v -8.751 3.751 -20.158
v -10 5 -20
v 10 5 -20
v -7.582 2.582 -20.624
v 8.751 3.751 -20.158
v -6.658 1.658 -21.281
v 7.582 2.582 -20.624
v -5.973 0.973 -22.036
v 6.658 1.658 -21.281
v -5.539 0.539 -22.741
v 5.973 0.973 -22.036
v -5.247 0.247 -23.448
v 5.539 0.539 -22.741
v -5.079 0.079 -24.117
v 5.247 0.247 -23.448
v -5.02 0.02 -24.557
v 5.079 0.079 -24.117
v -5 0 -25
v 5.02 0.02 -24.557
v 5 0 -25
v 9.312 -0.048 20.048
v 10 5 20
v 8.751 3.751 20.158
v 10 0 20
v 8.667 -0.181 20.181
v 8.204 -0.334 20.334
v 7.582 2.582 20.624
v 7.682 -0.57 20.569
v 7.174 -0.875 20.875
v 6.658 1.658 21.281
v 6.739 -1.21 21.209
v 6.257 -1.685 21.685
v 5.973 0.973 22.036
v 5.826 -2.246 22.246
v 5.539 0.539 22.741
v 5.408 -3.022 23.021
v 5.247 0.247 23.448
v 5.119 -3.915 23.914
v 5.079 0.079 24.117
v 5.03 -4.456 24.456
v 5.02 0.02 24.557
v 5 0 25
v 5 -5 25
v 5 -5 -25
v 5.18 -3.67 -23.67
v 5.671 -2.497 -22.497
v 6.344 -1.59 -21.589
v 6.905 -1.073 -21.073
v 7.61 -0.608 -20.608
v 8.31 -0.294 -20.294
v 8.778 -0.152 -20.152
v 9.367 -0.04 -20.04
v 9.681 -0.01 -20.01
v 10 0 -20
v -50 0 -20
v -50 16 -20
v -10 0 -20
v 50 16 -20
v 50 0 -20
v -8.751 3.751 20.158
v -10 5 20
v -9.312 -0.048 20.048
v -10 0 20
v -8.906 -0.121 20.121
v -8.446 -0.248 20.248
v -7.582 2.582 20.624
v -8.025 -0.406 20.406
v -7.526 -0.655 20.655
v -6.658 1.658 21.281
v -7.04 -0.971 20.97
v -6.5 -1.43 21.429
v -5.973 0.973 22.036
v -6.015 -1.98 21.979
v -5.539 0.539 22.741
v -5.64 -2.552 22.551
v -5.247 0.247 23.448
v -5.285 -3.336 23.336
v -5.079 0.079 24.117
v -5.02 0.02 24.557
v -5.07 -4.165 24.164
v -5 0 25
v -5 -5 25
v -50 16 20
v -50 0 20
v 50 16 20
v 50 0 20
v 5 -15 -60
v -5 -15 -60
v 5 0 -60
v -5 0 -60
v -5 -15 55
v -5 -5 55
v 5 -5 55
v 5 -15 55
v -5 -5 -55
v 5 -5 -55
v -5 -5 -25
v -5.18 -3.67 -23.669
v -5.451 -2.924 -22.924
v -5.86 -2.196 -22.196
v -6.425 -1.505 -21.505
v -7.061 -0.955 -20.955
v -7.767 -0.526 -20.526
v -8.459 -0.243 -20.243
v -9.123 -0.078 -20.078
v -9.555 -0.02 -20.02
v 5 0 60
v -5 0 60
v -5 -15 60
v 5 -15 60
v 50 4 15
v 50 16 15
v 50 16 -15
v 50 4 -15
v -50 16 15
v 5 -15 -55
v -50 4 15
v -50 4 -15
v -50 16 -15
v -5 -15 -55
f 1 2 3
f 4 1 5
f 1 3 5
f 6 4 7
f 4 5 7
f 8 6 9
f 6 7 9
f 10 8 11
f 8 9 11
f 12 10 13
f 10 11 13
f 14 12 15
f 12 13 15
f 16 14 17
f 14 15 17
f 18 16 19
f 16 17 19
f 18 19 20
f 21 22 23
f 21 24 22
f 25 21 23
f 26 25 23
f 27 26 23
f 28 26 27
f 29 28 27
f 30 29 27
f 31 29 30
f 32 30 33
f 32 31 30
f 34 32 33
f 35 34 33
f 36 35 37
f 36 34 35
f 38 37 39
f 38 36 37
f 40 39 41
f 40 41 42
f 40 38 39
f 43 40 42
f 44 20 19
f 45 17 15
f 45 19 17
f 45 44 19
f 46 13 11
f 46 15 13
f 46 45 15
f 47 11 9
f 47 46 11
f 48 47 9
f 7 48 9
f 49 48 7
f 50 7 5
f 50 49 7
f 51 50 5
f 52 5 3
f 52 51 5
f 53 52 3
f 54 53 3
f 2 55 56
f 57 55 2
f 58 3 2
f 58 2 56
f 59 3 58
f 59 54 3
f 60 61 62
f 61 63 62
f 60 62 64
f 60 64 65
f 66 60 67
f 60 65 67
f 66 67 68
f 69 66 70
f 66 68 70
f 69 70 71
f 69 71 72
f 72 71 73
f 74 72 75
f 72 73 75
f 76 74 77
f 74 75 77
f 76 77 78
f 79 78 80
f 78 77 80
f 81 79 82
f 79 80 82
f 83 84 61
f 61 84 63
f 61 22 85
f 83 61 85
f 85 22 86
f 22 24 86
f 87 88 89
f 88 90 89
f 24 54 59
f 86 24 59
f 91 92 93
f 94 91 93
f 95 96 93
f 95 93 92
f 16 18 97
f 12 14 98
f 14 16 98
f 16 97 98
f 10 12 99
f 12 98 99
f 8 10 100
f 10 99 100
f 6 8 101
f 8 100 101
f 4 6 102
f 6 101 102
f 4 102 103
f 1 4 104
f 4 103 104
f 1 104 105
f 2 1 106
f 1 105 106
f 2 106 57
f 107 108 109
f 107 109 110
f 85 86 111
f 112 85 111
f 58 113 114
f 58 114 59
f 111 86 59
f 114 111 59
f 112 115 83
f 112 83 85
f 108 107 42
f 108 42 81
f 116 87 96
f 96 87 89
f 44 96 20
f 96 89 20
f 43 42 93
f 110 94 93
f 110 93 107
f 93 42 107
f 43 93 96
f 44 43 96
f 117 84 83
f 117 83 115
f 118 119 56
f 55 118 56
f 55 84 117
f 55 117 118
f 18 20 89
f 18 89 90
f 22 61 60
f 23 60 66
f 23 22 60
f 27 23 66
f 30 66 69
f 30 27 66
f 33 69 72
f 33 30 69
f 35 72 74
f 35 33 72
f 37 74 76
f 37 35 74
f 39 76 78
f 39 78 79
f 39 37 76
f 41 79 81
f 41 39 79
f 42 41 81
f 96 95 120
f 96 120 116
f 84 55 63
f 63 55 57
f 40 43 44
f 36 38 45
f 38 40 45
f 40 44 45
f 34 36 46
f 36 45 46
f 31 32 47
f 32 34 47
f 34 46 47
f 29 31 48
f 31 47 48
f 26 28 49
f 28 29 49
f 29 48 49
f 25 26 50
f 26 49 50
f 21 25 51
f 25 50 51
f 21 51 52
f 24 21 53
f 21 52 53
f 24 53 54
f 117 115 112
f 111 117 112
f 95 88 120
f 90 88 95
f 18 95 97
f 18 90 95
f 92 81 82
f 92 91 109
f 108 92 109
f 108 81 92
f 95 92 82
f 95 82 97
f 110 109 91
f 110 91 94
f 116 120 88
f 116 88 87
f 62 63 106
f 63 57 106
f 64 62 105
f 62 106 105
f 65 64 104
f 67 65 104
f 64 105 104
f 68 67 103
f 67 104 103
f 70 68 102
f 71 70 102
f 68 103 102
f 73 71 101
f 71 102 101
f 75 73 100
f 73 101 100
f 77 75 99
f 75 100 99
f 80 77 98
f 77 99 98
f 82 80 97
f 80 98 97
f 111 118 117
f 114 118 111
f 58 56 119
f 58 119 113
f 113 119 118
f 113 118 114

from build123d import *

# Parameters (mm, degrees)
SKETCH1_W           = 100
SKETCH1_H           = 40
BOSS_EXTRUDE2_DEPTH = 16
SKETCH3_W           = 100
SKETCH3_H           = 30
CUT_EXTRUDE1_DEPTH  = 12
SKETCH4_W           = 10
SKETCH4_H           = 120
BOSS_EXTRUDE3_DEPTH = 5
SKETCH5_W           = 10
SKETCH5_H           = 5
BOSS_EXTRUDE4_DEPTH = 10
SKETCH6_W           = 10
SKETCH6_H           = 5
BOSS_EXTRUDE5_DEPTH = 10
FILLET1_R           = 5
FILLET2_R           = 5
FILLET3_R           = 5


with BuildPart() as part:
    # Sketch1 → Boss-Extrude2 (new body)
    with BuildSketch(Plane(origin=(0, 0, 0), x_dir=(1, 0, 0), z_dir=(0, 1, 0))):
        Rectangle(SKETCH1_W, SKETCH1_H)
    extrude(amount=BOSS_EXTRUDE2_DEPTH)

    # Sketch3 → Cut-Extrude1 (cut)
    with BuildSketch(Plane(origin=(0, 16, 0), x_dir=(1, 0, 0), z_dir=(0, 1, 0))):
        Rectangle(SKETCH3_W, SKETCH3_H)
    extrude(amount=-CUT_EXTRUDE1_DEPTH, mode=Mode.SUBTRACT)

    # Sketch4 → Boss-Extrude3 (add)
    with BuildSketch(Plane(origin=(0, 0, 0), x_dir=(-1, 0, 0), z_dir=(0, -1, 0))):
        Rectangle(SKETCH4_W, SKETCH4_H)
    extrude(amount=BOSS_EXTRUDE3_DEPTH)

    # Sketch5 → Boss-Extrude4 (add)
    with BuildSketch(Plane.XZ.offset(5)):
        with Locations((0, 57.5)):
            Rectangle(SKETCH5_W, SKETCH5_H)
    extrude(amount=BOSS_EXTRUDE4_DEPTH)

    # Sketch6 → Boss-Extrude5 (add)
    with BuildSketch(Plane.XZ.offset(5)):
        with Locations((0, -57.5)):
            Rectangle(SKETCH6_W, SKETCH6_H)
    extrude(amount=BOSS_EXTRUDE5_DEPTH)

    # Fillet1
    fillet1_edges = [part.edges().sort_by_distance(p)[0] for p in [
        (5, 0, 0),
    ]]
    fillet(fillet1_edges, radius=FILLET1_R - 0.0001)  # a hair under: the kernel refuses the full size

    # Fillet2
    fillet2_edges = [part.edges().sort_by_distance(p)[0] for p in [
        (-5, 0, 0),
    ]]
    fillet(fillet2_edges, radius=FILLET2_R - 0.0001)  # a hair under: the kernel refuses the full size

    # Fillet3
    fillet3_edges = [part.edges().sort_by_distance(p)[0] for p in [
        (0, 0, 20),
        (0, 0, -20),
        (-5, -2.49995, -20),
        (-5, -2.49995, 20),
        (5, -2.49995, 20),
        (5, -2.49995, -20),
    ]]
    fillet(fillet3_edges, radius=FILLET3_R - 0.0004)  # a hair under: the kernel refuses the full size


solid = part.part
